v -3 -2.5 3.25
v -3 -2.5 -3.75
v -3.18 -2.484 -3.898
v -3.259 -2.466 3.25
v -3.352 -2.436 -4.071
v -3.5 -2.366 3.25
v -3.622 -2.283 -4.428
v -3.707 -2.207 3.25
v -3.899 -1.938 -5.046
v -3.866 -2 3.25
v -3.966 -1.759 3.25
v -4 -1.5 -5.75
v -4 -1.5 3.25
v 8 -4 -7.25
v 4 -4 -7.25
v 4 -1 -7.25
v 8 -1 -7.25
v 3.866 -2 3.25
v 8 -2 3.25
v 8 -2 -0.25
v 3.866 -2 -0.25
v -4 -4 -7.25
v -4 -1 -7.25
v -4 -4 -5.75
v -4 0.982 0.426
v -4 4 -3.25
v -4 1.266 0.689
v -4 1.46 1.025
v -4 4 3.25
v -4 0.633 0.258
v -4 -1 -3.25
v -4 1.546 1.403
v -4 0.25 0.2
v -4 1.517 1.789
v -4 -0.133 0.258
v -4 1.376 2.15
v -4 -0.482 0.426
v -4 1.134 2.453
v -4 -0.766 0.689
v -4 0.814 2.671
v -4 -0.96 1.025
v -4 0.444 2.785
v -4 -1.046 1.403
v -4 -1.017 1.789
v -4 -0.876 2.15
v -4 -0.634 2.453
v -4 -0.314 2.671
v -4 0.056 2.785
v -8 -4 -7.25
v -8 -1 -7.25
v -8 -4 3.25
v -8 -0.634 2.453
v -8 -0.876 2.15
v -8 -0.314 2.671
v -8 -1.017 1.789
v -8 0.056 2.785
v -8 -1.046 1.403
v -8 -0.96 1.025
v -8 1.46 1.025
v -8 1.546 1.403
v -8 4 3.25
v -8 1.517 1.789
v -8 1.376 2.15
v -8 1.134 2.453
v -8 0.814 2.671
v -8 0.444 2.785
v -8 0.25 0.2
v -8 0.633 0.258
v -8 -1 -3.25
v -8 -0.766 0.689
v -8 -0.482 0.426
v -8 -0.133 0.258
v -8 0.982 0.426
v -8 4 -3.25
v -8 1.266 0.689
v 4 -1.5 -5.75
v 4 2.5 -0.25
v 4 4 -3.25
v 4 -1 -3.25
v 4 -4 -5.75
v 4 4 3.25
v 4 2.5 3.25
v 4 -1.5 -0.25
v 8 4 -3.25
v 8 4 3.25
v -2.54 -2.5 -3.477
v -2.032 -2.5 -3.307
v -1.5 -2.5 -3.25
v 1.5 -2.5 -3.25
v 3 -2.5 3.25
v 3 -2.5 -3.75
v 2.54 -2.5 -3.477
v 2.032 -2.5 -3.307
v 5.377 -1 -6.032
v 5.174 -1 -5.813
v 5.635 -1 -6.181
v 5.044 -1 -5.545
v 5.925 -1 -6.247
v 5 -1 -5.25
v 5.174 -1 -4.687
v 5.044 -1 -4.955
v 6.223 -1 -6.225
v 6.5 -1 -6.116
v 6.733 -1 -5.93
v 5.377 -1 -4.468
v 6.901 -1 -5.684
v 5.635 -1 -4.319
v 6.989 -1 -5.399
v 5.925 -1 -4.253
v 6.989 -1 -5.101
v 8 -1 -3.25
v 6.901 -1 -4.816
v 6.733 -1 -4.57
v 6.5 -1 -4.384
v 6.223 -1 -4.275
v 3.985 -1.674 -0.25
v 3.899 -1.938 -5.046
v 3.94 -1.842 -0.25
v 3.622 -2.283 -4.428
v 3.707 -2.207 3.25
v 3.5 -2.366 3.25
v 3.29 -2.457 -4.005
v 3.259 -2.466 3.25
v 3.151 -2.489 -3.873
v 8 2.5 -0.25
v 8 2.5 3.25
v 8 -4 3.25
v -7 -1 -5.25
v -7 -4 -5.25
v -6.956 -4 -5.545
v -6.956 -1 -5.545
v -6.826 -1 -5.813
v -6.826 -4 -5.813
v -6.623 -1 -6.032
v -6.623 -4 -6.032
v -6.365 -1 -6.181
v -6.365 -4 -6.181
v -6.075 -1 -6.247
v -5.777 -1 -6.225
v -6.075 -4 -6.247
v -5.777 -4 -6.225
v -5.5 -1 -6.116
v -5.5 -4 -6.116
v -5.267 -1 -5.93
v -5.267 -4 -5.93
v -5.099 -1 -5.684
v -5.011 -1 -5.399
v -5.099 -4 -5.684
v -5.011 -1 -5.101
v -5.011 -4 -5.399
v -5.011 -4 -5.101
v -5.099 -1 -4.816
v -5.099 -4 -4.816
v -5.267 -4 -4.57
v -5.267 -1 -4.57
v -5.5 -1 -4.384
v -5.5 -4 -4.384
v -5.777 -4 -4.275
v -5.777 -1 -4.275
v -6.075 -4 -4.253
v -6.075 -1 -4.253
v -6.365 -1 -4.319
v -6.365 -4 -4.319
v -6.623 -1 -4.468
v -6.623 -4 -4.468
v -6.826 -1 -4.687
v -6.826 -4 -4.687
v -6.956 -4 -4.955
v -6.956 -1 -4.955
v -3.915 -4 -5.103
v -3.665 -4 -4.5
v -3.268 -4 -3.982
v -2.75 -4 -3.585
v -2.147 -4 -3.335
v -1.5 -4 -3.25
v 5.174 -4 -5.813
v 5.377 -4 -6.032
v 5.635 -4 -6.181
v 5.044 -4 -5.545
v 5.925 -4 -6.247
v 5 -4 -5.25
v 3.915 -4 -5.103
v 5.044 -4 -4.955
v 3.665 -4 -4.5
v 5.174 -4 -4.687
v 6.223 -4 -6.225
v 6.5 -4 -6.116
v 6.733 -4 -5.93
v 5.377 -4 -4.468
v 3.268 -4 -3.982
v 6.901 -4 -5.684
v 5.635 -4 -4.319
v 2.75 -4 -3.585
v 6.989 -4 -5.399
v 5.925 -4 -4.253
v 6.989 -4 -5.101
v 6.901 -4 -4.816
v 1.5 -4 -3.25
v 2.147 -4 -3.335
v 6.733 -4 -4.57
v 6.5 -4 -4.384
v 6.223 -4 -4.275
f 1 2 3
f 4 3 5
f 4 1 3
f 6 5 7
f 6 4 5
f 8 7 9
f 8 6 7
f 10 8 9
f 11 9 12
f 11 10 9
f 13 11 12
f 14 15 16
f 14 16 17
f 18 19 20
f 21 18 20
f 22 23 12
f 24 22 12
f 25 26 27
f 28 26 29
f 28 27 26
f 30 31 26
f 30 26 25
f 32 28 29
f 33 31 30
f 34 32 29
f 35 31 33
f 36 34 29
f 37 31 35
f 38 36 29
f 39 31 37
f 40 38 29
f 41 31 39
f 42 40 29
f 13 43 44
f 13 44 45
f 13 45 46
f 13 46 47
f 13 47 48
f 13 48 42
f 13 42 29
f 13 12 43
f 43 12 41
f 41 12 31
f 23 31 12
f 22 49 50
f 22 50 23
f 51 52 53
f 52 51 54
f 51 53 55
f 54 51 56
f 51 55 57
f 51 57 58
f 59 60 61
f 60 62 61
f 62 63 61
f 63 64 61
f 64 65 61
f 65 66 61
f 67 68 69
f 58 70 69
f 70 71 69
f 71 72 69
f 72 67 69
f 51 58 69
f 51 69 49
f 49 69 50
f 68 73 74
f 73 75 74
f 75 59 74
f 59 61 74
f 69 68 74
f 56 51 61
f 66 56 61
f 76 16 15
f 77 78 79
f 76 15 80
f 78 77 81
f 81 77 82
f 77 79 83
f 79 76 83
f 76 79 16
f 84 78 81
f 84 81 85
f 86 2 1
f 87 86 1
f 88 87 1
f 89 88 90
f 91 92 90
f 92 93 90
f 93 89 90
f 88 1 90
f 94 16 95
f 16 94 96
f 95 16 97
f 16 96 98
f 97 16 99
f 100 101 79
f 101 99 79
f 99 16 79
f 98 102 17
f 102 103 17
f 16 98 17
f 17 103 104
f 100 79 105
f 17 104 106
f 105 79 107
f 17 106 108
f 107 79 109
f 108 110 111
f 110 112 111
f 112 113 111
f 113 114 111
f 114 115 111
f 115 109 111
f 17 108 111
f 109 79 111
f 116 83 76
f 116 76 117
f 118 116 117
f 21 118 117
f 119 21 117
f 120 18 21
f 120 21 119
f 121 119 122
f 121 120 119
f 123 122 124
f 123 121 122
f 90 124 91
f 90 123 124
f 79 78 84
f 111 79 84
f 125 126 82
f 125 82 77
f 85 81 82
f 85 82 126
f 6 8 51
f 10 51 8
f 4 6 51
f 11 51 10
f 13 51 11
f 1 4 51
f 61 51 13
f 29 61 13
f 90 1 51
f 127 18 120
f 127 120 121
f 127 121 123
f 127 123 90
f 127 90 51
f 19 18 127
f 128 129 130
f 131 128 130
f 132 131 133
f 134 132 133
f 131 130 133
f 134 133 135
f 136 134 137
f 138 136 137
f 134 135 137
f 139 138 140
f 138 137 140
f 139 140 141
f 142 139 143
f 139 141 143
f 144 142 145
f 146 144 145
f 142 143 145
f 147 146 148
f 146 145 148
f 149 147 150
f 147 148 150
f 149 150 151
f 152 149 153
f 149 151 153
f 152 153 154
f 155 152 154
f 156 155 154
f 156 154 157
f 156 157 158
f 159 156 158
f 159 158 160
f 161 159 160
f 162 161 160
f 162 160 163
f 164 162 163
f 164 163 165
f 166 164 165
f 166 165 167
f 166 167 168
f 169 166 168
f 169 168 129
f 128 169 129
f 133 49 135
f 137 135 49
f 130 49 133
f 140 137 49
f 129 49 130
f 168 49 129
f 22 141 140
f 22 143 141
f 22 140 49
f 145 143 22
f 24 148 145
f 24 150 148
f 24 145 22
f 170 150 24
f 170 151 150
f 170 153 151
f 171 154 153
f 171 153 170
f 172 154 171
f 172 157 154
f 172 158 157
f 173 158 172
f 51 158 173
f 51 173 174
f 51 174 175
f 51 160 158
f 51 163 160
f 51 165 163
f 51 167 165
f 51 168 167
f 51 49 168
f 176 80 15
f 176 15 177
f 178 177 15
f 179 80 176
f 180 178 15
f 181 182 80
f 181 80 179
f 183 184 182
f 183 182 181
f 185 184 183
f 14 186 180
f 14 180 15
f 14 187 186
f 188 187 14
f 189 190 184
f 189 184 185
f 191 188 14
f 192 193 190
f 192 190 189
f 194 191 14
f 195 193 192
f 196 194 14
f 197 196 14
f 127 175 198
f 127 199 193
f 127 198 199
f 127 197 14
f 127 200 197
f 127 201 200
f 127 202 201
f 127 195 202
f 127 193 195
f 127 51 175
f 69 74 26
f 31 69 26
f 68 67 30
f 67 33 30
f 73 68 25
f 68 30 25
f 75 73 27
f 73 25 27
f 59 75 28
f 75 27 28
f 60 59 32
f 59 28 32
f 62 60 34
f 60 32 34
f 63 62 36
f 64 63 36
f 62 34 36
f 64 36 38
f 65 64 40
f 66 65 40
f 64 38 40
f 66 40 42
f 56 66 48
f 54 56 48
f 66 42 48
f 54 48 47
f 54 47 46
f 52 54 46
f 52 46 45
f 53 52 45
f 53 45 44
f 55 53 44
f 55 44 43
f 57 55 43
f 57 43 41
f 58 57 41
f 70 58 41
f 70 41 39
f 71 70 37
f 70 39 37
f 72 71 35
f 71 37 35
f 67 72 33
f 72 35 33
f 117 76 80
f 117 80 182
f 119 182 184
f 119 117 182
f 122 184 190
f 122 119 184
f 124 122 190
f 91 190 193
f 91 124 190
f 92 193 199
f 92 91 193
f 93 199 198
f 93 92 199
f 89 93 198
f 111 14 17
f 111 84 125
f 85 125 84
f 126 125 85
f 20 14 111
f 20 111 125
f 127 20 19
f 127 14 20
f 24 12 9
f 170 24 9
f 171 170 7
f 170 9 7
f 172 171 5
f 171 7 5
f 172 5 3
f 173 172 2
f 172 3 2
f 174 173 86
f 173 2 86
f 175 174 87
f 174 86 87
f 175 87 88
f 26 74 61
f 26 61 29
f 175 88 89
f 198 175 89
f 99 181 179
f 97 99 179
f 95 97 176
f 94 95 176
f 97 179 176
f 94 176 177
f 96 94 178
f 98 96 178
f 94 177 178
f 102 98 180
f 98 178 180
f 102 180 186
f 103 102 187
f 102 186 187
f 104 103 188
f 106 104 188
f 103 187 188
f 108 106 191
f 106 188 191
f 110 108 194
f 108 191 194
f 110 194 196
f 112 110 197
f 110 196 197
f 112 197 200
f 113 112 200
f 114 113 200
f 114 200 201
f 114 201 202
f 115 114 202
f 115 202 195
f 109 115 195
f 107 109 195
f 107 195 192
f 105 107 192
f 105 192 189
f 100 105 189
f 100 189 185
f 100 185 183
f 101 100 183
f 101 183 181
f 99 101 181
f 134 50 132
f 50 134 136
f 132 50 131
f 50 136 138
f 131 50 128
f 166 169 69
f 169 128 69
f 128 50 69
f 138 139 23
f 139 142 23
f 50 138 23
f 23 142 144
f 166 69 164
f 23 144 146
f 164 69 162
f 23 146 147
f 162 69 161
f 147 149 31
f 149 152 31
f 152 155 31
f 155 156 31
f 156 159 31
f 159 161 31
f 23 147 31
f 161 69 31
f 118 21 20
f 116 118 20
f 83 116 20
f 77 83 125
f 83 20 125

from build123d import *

# Parameters (mm, degrees)
SKETCH1_W                  = 16
SKETCH1_H                  = 6.5
BOSS_EXTRUDE1_DEPTH        = 4
SKETCH2_W                  = 8
SKETCH2_H                  = 6.5
CUT_EXTRUDE1_DEPTH         = 6.5
SKETCH10_W                 = 4
SKETCH10_H                 = 4
BOSS_EXTRUDE2_DEPTH        = 3
M1_6_CLEARANCE_HOLE1_D     = 2
M1_6_CLEARANCE_HOLE1_DEPTH = 4
M1_6_CLEARANCE_HOLE1_TIP   = 0.600860619
FILLET1_R                  = 1
FILLET2_R                  = 2.5
SKETCH14_W                 = 3.5
SKETCH14_H                 = 4.5
CUT_EXTRUDE3_DEPTH         = 5
M2_CLEARANCE_HOLE3_D       = 2.6
M2_CLEARANCE_HOLE3_DEPTH   = 4
M2_CLEARANCE_HOLE3_TIP     = 0.781118805


with BuildPart() as part:
    # Sketch1 → Boss-Extrude1 (new body, symmetric)
    with BuildSketch(Plane(origin=(0, 0, 0), x_dir=(1, 0, 0), z_dir=(0, 1, 0))):
        Rectangle(SKETCH1_W, SKETCH1_H)
    extrude(amount=BOSS_EXTRUDE1_DEPTH, both=True)

    # Sketch2 → Cut-Extrude1 (cut)
    with BuildSketch(Plane(origin=(0, 4, 5), x_dir=(1, 0, 0), z_dir=(0, -1, 0))):
        with Locations((0, -5)):
            Rectangle(SKETCH2_W, SKETCH2_H)
    extrude(amount=CUT_EXTRUDE1_DEPTH, mode=Mode.SUBTRACT)

    # Sketch10 → Boss-Extrude2 (add)
    with BuildSketch(Plane.XZ.offset(4)):
        with Locations((6, -5.25)):
            Rectangle(SKETCH10_W, SKETCH10_H)
        with Locations((-6, -5.25)):
            Rectangle(SKETCH10_W, SKETCH10_H)
    extrude(amount=-BOSS_EXTRUDE2_DEPTH)

    # M1.6 Clearance Hole1
    with Locations(Plane(origin=(0, -1, 0), x_dir=(1, 0, 0), z_dir=(0, 1, 0))):
        with Locations((6, 5.25), (-6, 5.25)):
            Hole(M1_6_CLEARANCE_HOLE1_D / 2, depth=M1_6_CLEARANCE_HOLE1_DEPTH)
            with Locations((0, 0, -(M1_6_CLEARANCE_HOLE1_DEPTH + M1_6_CLEARANCE_HOLE1_TIP / 2))):  # 118° drill point
                Cone(0, M1_6_CLEARANCE_HOLE1_D / 2, M1_6_CLEARANCE_HOLE1_TIP, mode=Mode.SUBTRACT)

    # Fillet1
    fillet1_edges = [part.edges().sort_by_distance(p)[0] for p in [
        (4, -2.5, 0),
        (-4, -2.5, 0),
    ]]
    fillet(fillet1_edges, radius=FILLET1_R)

    # Fillet2
    fillet2_edges = [part.edges().sort_by_distance(p)[0] for p in [
        (-4, -3.25, -3.25),
        (4, -3.25, -3.25),
    ]]
    fillet(fillet2_edges, radius=FILLET2_R)

    # Sketch14 → Cut-Extrude3 (cut)
    with BuildSketch(Plane(origin=(8, 0, 0), x_dir=(0, 0, -1), z_dir=(1, 0, 0))):
        with Locations((-1.5, 0.25)):
            Rectangle(SKETCH14_W, SKETCH14_H)
    extrude(amount=-CUT_EXTRUDE3_DEPTH, mode=Mode.SUBTRACT)

    # M2 Clearance Hole3
    with Locations(Plane.ZY.offset(8)):
        with Locations((1.5, 0.25)):
            Hole(M2_CLEARANCE_HOLE3_D / 2, depth=M2_CLEARANCE_HOLE3_DEPTH)
            with Locations((0, 0, -(M2_CLEARANCE_HOLE3_DEPTH + M2_CLEARANCE_HOLE3_TIP / 2))):  # 118° drill point
                Cone(0, M2_CLEARANCE_HOLE3_D / 2, M2_CLEARANCE_HOLE3_TIP, mode=Mode.SUBTRACT)


solid = part.part
